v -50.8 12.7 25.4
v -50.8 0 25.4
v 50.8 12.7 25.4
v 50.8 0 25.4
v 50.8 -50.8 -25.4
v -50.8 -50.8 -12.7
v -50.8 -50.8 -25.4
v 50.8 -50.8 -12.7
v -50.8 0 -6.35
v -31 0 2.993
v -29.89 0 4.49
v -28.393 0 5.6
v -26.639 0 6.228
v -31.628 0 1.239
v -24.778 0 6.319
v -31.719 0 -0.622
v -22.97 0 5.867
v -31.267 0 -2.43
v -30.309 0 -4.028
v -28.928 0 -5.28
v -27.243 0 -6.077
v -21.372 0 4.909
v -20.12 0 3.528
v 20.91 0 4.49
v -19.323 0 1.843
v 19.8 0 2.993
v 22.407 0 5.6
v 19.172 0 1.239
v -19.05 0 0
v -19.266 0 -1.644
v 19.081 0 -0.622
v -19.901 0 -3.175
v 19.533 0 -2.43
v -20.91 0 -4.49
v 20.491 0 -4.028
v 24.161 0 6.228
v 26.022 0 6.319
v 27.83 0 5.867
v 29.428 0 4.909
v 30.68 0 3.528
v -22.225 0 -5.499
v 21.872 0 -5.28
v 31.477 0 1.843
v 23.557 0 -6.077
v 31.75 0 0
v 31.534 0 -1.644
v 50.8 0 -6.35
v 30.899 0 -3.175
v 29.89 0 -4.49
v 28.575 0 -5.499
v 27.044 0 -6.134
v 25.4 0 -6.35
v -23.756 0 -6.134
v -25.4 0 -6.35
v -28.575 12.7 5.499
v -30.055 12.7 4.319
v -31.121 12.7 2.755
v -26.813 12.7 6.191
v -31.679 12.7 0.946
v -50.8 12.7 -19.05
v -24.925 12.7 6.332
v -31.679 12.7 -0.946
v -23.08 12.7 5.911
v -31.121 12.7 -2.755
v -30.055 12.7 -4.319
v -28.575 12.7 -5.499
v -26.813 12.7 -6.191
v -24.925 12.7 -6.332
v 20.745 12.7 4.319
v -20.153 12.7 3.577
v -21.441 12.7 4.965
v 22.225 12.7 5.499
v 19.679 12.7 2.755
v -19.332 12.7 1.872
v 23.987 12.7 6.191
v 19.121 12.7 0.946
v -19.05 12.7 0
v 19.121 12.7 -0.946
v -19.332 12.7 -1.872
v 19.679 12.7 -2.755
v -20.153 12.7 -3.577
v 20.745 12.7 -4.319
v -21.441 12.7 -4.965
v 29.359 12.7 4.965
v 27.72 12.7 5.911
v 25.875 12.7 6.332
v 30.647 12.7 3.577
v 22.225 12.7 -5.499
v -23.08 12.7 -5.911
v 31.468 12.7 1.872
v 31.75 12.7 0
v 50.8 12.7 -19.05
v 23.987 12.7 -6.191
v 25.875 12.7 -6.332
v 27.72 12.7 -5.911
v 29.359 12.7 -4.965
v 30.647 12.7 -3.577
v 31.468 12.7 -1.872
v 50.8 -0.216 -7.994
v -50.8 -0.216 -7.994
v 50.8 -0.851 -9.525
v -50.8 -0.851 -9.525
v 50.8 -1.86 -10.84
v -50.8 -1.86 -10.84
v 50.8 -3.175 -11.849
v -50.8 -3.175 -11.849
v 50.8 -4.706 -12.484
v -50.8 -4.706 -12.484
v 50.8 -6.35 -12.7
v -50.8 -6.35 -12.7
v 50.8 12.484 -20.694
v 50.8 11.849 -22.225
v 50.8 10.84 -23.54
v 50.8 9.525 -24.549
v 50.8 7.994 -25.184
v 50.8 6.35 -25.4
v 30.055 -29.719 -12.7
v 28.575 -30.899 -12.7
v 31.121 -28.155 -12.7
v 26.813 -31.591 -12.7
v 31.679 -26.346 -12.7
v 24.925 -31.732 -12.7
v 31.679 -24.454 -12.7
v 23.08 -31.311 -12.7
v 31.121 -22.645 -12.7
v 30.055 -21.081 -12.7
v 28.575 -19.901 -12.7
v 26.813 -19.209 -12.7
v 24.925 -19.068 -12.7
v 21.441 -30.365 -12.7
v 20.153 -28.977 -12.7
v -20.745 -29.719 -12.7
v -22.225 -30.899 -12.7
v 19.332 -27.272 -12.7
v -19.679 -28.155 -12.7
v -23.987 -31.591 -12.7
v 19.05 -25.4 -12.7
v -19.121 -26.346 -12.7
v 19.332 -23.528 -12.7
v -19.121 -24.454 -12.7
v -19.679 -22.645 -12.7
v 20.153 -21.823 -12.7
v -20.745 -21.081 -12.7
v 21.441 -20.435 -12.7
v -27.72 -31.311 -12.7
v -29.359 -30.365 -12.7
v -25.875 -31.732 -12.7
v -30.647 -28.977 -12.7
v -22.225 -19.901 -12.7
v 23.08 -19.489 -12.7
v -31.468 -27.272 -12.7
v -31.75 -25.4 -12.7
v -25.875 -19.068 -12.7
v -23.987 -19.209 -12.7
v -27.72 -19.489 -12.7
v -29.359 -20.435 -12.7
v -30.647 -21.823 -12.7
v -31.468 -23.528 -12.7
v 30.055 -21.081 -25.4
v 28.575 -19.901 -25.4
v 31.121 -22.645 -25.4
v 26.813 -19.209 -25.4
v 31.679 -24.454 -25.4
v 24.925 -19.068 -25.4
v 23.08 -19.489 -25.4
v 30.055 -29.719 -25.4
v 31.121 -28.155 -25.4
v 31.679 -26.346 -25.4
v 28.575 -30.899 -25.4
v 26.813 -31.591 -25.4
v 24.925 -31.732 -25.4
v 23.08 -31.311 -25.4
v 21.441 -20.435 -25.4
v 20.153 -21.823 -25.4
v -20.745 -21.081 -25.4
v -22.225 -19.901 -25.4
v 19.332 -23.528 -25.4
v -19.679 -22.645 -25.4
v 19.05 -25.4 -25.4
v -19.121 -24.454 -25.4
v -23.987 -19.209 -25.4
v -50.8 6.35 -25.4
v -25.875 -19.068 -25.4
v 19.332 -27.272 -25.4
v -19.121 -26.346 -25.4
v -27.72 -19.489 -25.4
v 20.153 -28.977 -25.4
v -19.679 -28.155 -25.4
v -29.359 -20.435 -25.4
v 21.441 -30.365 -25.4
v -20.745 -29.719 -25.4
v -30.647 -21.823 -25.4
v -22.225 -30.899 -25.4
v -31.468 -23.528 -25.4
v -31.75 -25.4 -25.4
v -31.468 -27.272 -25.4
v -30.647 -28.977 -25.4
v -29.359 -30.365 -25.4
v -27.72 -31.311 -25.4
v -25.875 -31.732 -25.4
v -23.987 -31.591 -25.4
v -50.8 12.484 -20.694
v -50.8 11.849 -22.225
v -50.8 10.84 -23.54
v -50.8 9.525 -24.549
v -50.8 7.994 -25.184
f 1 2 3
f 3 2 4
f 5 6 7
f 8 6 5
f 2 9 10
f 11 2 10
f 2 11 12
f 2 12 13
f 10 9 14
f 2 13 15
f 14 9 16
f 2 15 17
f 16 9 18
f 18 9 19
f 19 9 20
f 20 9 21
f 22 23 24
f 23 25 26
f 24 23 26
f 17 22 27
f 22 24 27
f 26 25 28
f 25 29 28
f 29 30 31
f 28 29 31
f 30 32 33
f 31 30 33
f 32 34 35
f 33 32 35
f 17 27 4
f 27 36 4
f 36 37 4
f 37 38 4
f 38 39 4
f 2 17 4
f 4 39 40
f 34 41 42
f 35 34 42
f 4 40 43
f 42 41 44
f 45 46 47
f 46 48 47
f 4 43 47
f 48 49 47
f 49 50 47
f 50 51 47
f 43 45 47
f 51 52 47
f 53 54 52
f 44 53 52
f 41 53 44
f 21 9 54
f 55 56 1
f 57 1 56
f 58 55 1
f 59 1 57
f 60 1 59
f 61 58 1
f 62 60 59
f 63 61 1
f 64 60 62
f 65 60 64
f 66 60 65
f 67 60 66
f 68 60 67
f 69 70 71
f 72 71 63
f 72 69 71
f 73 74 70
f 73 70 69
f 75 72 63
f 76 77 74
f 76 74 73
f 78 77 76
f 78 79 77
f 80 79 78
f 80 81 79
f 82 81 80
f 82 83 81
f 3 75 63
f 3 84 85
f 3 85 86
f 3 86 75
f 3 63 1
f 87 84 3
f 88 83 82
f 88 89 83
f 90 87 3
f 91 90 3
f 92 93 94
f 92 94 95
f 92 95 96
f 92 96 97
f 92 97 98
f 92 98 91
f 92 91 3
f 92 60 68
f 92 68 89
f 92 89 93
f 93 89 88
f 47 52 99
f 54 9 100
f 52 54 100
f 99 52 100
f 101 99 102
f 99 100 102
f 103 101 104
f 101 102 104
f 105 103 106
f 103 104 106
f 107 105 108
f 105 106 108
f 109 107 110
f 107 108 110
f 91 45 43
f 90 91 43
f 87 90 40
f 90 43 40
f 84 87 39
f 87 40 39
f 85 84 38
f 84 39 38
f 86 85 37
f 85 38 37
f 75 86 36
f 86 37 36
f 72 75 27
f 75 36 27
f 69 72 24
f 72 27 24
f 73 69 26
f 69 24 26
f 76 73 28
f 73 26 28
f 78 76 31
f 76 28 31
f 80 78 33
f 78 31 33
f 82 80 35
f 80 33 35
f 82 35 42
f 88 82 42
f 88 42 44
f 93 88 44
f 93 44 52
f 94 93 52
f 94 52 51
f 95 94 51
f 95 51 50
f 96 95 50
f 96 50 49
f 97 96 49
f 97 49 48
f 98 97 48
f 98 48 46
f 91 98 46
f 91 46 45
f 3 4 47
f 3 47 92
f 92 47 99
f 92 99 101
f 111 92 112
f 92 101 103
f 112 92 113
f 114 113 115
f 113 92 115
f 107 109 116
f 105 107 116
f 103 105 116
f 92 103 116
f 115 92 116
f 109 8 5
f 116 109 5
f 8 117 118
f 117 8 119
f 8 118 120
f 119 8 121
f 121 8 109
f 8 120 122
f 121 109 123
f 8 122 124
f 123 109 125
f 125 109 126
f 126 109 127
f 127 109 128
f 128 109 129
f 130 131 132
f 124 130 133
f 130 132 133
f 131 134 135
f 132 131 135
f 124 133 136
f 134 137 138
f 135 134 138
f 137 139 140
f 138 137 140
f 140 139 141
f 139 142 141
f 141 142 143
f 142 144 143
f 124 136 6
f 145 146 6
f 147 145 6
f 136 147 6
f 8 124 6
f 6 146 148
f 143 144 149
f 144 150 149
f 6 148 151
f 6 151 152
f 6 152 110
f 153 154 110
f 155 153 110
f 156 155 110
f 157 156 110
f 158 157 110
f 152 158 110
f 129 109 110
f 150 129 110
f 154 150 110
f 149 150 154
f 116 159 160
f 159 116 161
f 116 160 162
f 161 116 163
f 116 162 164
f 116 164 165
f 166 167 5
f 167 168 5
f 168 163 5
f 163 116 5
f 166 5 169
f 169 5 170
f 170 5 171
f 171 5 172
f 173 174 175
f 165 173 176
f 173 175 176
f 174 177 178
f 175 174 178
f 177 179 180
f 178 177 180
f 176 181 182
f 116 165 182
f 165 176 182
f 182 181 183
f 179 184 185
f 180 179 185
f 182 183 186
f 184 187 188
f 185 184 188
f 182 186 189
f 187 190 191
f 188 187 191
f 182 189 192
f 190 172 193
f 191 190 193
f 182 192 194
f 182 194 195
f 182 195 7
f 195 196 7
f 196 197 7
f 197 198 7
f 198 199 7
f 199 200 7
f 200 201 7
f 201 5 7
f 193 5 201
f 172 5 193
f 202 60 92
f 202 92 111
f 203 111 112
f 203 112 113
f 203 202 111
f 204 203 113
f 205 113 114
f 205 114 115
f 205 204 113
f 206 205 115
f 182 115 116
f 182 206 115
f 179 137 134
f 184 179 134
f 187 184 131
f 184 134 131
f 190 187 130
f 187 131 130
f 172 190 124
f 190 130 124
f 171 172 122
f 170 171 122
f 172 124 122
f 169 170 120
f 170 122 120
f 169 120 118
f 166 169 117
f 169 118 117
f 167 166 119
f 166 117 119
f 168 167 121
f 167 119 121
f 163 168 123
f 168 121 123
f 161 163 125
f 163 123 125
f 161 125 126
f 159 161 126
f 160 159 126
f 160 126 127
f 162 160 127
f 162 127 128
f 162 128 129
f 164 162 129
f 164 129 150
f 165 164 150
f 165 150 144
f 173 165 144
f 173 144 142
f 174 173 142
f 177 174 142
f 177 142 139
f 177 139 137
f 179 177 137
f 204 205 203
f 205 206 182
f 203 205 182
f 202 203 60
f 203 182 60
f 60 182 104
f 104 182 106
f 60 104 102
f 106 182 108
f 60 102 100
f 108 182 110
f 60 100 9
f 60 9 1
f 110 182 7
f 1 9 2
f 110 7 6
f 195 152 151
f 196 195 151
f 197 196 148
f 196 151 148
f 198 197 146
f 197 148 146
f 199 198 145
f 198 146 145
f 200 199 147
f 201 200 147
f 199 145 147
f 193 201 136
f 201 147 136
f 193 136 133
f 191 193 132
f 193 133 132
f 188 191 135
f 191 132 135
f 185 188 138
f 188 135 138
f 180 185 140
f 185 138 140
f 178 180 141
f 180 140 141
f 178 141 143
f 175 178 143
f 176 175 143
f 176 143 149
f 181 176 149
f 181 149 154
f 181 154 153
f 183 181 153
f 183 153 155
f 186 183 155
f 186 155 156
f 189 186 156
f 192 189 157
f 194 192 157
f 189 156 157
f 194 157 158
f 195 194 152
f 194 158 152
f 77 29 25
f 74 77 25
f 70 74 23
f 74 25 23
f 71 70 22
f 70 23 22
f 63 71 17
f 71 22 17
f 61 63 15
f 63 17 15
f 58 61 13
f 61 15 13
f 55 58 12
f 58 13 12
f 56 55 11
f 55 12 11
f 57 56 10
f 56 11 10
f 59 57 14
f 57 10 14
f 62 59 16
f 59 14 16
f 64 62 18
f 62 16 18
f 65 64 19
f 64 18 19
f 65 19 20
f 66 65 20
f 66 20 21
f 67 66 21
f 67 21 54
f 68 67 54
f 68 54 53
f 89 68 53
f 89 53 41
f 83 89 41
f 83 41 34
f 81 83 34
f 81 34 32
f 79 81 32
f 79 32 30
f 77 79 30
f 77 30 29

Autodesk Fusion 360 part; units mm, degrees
sketch "Sketch1" plane through (0, 0, 0) normal (0, 1, 0) x (1, 0, 0)
  line L0 (50.8, 25.4) -> (-50.8, 25.4)
  line L1 (-50.8, 25.4) -> (-50.8, -25.4)
  line L2 (-50.8, -25.4) -> (50.8, -25.4)
  line L3 (50.8, -25.4) -> (50.8, 25.4)
  line L4 (0, 0) -> (25.4, 0) construction
  line L5 (0, 0) -> (-25.4, 0) construction
  circle A0 centre (-25.4, 0) radius 6.35
  circle A1 centre (25.4, 0) radius 6.35
  dimension "d3" = 101.6
  dimension "d4" = 50.8
  dimension "d5" = 25.4
  dimension "d7" = 12.7
  dimension "d8" = 12.7
extrude "Extrude1" add sketch "Sketch1" along normal blind 12.7 makes body 1
sketch "Sketch2" plane through (0, 0, 0) normal (0, -1, 0) x (1, 0, 0)
  circle A0 centre (-25.4, 0) radius 6.35
  circle A1 centre (25.4, 0) radius 6.35
  line L0 (50.8, -25.4) -> (50.8, 25.4)
  line L1 (50.8, 25.4) -> (-50.8, 25.4)
  line L2 (-50.8, 25.4) -> (-50.8, -25.4)
  line L3 (-50.8, -25.4) -> (50.8, -25.4)
  line L4 (-50.8, -25.4) -> (50.8, -25.4)
  line L5 (50.8, -25.4) -> (50.8, -12.7)
  line L6 (50.8, -12.7) -> (-50.8, -12.7)
  line L7 (-50.8, -12.7) -> (-50.8, -25.4)
  dimension "d11" = 101.6
  dimension "d12" = 12.7
extrude "Extrude2" add sketch "Sketch2" along normal blind 50.8 contours L0 L2 L3 L4 L5 L6 L7 bodies 1
sketch "Sketch3" plane through (0, 0, -12.7) normal (0, 0, 1) x (-1, 0, 0)
  line L0 (-50.8, 0) -> (50.8, 0)
  line L1 (50.8, 0) -> (50.8, 50.8)
  line L2 (50.8, 50.8) -> (-50.8, 50.8)
  line L3 (-50.8, 50.8) -> (-50.8, 0)
  line L4 (0, 0) -> (0, 50.8) construction
  line L5 (0, 25.4) -> (-25.4, 25.4) construction
  line L6 (0, 25.4) -> (25.4, 25.4) construction
  circle A0 centre (25.4, 25.4) radius 6.35
  circle A1 centre (-25.4, 25.4) radius 6.35
  dimension "d15" = 25.4
  dimension "d16" = 25.4
  dimension "d17" = 12.7
  dimension "d18" = 12.7
extrude "Extrude3" cut sketch "Sketch3" against normal blind 43.18 contours A0 | A1 bodies 1
fillet "Fillet1" radius 6.35 2 edges at (0, 0, -12.7) (0, 12.7, -25.4) on bodies 1
copy_body "Body->Comp1" bodies 1 removing the originals makes body 2 in component "Clamp/Mount Bracket"
component "Clamp/Mount Bracket" placed x (1, 0, 0) y (0, 1, 0) z (0, 0, 1) at (0, 0, 0)
equation "d7 = ( 1 / 2 ) * 1 in"
equation "d8 = ( 1 / 2 ) * 1 in"
equation "d9 = ( 1 / 2 ) * 1 in"
equation "d17 = ( 1 / 2 ) * 1 in"
equation "d18 = ( 1 / 2 ) * 1 in"
equation "d22 = ( 1 / 4 ) * 1 in"
